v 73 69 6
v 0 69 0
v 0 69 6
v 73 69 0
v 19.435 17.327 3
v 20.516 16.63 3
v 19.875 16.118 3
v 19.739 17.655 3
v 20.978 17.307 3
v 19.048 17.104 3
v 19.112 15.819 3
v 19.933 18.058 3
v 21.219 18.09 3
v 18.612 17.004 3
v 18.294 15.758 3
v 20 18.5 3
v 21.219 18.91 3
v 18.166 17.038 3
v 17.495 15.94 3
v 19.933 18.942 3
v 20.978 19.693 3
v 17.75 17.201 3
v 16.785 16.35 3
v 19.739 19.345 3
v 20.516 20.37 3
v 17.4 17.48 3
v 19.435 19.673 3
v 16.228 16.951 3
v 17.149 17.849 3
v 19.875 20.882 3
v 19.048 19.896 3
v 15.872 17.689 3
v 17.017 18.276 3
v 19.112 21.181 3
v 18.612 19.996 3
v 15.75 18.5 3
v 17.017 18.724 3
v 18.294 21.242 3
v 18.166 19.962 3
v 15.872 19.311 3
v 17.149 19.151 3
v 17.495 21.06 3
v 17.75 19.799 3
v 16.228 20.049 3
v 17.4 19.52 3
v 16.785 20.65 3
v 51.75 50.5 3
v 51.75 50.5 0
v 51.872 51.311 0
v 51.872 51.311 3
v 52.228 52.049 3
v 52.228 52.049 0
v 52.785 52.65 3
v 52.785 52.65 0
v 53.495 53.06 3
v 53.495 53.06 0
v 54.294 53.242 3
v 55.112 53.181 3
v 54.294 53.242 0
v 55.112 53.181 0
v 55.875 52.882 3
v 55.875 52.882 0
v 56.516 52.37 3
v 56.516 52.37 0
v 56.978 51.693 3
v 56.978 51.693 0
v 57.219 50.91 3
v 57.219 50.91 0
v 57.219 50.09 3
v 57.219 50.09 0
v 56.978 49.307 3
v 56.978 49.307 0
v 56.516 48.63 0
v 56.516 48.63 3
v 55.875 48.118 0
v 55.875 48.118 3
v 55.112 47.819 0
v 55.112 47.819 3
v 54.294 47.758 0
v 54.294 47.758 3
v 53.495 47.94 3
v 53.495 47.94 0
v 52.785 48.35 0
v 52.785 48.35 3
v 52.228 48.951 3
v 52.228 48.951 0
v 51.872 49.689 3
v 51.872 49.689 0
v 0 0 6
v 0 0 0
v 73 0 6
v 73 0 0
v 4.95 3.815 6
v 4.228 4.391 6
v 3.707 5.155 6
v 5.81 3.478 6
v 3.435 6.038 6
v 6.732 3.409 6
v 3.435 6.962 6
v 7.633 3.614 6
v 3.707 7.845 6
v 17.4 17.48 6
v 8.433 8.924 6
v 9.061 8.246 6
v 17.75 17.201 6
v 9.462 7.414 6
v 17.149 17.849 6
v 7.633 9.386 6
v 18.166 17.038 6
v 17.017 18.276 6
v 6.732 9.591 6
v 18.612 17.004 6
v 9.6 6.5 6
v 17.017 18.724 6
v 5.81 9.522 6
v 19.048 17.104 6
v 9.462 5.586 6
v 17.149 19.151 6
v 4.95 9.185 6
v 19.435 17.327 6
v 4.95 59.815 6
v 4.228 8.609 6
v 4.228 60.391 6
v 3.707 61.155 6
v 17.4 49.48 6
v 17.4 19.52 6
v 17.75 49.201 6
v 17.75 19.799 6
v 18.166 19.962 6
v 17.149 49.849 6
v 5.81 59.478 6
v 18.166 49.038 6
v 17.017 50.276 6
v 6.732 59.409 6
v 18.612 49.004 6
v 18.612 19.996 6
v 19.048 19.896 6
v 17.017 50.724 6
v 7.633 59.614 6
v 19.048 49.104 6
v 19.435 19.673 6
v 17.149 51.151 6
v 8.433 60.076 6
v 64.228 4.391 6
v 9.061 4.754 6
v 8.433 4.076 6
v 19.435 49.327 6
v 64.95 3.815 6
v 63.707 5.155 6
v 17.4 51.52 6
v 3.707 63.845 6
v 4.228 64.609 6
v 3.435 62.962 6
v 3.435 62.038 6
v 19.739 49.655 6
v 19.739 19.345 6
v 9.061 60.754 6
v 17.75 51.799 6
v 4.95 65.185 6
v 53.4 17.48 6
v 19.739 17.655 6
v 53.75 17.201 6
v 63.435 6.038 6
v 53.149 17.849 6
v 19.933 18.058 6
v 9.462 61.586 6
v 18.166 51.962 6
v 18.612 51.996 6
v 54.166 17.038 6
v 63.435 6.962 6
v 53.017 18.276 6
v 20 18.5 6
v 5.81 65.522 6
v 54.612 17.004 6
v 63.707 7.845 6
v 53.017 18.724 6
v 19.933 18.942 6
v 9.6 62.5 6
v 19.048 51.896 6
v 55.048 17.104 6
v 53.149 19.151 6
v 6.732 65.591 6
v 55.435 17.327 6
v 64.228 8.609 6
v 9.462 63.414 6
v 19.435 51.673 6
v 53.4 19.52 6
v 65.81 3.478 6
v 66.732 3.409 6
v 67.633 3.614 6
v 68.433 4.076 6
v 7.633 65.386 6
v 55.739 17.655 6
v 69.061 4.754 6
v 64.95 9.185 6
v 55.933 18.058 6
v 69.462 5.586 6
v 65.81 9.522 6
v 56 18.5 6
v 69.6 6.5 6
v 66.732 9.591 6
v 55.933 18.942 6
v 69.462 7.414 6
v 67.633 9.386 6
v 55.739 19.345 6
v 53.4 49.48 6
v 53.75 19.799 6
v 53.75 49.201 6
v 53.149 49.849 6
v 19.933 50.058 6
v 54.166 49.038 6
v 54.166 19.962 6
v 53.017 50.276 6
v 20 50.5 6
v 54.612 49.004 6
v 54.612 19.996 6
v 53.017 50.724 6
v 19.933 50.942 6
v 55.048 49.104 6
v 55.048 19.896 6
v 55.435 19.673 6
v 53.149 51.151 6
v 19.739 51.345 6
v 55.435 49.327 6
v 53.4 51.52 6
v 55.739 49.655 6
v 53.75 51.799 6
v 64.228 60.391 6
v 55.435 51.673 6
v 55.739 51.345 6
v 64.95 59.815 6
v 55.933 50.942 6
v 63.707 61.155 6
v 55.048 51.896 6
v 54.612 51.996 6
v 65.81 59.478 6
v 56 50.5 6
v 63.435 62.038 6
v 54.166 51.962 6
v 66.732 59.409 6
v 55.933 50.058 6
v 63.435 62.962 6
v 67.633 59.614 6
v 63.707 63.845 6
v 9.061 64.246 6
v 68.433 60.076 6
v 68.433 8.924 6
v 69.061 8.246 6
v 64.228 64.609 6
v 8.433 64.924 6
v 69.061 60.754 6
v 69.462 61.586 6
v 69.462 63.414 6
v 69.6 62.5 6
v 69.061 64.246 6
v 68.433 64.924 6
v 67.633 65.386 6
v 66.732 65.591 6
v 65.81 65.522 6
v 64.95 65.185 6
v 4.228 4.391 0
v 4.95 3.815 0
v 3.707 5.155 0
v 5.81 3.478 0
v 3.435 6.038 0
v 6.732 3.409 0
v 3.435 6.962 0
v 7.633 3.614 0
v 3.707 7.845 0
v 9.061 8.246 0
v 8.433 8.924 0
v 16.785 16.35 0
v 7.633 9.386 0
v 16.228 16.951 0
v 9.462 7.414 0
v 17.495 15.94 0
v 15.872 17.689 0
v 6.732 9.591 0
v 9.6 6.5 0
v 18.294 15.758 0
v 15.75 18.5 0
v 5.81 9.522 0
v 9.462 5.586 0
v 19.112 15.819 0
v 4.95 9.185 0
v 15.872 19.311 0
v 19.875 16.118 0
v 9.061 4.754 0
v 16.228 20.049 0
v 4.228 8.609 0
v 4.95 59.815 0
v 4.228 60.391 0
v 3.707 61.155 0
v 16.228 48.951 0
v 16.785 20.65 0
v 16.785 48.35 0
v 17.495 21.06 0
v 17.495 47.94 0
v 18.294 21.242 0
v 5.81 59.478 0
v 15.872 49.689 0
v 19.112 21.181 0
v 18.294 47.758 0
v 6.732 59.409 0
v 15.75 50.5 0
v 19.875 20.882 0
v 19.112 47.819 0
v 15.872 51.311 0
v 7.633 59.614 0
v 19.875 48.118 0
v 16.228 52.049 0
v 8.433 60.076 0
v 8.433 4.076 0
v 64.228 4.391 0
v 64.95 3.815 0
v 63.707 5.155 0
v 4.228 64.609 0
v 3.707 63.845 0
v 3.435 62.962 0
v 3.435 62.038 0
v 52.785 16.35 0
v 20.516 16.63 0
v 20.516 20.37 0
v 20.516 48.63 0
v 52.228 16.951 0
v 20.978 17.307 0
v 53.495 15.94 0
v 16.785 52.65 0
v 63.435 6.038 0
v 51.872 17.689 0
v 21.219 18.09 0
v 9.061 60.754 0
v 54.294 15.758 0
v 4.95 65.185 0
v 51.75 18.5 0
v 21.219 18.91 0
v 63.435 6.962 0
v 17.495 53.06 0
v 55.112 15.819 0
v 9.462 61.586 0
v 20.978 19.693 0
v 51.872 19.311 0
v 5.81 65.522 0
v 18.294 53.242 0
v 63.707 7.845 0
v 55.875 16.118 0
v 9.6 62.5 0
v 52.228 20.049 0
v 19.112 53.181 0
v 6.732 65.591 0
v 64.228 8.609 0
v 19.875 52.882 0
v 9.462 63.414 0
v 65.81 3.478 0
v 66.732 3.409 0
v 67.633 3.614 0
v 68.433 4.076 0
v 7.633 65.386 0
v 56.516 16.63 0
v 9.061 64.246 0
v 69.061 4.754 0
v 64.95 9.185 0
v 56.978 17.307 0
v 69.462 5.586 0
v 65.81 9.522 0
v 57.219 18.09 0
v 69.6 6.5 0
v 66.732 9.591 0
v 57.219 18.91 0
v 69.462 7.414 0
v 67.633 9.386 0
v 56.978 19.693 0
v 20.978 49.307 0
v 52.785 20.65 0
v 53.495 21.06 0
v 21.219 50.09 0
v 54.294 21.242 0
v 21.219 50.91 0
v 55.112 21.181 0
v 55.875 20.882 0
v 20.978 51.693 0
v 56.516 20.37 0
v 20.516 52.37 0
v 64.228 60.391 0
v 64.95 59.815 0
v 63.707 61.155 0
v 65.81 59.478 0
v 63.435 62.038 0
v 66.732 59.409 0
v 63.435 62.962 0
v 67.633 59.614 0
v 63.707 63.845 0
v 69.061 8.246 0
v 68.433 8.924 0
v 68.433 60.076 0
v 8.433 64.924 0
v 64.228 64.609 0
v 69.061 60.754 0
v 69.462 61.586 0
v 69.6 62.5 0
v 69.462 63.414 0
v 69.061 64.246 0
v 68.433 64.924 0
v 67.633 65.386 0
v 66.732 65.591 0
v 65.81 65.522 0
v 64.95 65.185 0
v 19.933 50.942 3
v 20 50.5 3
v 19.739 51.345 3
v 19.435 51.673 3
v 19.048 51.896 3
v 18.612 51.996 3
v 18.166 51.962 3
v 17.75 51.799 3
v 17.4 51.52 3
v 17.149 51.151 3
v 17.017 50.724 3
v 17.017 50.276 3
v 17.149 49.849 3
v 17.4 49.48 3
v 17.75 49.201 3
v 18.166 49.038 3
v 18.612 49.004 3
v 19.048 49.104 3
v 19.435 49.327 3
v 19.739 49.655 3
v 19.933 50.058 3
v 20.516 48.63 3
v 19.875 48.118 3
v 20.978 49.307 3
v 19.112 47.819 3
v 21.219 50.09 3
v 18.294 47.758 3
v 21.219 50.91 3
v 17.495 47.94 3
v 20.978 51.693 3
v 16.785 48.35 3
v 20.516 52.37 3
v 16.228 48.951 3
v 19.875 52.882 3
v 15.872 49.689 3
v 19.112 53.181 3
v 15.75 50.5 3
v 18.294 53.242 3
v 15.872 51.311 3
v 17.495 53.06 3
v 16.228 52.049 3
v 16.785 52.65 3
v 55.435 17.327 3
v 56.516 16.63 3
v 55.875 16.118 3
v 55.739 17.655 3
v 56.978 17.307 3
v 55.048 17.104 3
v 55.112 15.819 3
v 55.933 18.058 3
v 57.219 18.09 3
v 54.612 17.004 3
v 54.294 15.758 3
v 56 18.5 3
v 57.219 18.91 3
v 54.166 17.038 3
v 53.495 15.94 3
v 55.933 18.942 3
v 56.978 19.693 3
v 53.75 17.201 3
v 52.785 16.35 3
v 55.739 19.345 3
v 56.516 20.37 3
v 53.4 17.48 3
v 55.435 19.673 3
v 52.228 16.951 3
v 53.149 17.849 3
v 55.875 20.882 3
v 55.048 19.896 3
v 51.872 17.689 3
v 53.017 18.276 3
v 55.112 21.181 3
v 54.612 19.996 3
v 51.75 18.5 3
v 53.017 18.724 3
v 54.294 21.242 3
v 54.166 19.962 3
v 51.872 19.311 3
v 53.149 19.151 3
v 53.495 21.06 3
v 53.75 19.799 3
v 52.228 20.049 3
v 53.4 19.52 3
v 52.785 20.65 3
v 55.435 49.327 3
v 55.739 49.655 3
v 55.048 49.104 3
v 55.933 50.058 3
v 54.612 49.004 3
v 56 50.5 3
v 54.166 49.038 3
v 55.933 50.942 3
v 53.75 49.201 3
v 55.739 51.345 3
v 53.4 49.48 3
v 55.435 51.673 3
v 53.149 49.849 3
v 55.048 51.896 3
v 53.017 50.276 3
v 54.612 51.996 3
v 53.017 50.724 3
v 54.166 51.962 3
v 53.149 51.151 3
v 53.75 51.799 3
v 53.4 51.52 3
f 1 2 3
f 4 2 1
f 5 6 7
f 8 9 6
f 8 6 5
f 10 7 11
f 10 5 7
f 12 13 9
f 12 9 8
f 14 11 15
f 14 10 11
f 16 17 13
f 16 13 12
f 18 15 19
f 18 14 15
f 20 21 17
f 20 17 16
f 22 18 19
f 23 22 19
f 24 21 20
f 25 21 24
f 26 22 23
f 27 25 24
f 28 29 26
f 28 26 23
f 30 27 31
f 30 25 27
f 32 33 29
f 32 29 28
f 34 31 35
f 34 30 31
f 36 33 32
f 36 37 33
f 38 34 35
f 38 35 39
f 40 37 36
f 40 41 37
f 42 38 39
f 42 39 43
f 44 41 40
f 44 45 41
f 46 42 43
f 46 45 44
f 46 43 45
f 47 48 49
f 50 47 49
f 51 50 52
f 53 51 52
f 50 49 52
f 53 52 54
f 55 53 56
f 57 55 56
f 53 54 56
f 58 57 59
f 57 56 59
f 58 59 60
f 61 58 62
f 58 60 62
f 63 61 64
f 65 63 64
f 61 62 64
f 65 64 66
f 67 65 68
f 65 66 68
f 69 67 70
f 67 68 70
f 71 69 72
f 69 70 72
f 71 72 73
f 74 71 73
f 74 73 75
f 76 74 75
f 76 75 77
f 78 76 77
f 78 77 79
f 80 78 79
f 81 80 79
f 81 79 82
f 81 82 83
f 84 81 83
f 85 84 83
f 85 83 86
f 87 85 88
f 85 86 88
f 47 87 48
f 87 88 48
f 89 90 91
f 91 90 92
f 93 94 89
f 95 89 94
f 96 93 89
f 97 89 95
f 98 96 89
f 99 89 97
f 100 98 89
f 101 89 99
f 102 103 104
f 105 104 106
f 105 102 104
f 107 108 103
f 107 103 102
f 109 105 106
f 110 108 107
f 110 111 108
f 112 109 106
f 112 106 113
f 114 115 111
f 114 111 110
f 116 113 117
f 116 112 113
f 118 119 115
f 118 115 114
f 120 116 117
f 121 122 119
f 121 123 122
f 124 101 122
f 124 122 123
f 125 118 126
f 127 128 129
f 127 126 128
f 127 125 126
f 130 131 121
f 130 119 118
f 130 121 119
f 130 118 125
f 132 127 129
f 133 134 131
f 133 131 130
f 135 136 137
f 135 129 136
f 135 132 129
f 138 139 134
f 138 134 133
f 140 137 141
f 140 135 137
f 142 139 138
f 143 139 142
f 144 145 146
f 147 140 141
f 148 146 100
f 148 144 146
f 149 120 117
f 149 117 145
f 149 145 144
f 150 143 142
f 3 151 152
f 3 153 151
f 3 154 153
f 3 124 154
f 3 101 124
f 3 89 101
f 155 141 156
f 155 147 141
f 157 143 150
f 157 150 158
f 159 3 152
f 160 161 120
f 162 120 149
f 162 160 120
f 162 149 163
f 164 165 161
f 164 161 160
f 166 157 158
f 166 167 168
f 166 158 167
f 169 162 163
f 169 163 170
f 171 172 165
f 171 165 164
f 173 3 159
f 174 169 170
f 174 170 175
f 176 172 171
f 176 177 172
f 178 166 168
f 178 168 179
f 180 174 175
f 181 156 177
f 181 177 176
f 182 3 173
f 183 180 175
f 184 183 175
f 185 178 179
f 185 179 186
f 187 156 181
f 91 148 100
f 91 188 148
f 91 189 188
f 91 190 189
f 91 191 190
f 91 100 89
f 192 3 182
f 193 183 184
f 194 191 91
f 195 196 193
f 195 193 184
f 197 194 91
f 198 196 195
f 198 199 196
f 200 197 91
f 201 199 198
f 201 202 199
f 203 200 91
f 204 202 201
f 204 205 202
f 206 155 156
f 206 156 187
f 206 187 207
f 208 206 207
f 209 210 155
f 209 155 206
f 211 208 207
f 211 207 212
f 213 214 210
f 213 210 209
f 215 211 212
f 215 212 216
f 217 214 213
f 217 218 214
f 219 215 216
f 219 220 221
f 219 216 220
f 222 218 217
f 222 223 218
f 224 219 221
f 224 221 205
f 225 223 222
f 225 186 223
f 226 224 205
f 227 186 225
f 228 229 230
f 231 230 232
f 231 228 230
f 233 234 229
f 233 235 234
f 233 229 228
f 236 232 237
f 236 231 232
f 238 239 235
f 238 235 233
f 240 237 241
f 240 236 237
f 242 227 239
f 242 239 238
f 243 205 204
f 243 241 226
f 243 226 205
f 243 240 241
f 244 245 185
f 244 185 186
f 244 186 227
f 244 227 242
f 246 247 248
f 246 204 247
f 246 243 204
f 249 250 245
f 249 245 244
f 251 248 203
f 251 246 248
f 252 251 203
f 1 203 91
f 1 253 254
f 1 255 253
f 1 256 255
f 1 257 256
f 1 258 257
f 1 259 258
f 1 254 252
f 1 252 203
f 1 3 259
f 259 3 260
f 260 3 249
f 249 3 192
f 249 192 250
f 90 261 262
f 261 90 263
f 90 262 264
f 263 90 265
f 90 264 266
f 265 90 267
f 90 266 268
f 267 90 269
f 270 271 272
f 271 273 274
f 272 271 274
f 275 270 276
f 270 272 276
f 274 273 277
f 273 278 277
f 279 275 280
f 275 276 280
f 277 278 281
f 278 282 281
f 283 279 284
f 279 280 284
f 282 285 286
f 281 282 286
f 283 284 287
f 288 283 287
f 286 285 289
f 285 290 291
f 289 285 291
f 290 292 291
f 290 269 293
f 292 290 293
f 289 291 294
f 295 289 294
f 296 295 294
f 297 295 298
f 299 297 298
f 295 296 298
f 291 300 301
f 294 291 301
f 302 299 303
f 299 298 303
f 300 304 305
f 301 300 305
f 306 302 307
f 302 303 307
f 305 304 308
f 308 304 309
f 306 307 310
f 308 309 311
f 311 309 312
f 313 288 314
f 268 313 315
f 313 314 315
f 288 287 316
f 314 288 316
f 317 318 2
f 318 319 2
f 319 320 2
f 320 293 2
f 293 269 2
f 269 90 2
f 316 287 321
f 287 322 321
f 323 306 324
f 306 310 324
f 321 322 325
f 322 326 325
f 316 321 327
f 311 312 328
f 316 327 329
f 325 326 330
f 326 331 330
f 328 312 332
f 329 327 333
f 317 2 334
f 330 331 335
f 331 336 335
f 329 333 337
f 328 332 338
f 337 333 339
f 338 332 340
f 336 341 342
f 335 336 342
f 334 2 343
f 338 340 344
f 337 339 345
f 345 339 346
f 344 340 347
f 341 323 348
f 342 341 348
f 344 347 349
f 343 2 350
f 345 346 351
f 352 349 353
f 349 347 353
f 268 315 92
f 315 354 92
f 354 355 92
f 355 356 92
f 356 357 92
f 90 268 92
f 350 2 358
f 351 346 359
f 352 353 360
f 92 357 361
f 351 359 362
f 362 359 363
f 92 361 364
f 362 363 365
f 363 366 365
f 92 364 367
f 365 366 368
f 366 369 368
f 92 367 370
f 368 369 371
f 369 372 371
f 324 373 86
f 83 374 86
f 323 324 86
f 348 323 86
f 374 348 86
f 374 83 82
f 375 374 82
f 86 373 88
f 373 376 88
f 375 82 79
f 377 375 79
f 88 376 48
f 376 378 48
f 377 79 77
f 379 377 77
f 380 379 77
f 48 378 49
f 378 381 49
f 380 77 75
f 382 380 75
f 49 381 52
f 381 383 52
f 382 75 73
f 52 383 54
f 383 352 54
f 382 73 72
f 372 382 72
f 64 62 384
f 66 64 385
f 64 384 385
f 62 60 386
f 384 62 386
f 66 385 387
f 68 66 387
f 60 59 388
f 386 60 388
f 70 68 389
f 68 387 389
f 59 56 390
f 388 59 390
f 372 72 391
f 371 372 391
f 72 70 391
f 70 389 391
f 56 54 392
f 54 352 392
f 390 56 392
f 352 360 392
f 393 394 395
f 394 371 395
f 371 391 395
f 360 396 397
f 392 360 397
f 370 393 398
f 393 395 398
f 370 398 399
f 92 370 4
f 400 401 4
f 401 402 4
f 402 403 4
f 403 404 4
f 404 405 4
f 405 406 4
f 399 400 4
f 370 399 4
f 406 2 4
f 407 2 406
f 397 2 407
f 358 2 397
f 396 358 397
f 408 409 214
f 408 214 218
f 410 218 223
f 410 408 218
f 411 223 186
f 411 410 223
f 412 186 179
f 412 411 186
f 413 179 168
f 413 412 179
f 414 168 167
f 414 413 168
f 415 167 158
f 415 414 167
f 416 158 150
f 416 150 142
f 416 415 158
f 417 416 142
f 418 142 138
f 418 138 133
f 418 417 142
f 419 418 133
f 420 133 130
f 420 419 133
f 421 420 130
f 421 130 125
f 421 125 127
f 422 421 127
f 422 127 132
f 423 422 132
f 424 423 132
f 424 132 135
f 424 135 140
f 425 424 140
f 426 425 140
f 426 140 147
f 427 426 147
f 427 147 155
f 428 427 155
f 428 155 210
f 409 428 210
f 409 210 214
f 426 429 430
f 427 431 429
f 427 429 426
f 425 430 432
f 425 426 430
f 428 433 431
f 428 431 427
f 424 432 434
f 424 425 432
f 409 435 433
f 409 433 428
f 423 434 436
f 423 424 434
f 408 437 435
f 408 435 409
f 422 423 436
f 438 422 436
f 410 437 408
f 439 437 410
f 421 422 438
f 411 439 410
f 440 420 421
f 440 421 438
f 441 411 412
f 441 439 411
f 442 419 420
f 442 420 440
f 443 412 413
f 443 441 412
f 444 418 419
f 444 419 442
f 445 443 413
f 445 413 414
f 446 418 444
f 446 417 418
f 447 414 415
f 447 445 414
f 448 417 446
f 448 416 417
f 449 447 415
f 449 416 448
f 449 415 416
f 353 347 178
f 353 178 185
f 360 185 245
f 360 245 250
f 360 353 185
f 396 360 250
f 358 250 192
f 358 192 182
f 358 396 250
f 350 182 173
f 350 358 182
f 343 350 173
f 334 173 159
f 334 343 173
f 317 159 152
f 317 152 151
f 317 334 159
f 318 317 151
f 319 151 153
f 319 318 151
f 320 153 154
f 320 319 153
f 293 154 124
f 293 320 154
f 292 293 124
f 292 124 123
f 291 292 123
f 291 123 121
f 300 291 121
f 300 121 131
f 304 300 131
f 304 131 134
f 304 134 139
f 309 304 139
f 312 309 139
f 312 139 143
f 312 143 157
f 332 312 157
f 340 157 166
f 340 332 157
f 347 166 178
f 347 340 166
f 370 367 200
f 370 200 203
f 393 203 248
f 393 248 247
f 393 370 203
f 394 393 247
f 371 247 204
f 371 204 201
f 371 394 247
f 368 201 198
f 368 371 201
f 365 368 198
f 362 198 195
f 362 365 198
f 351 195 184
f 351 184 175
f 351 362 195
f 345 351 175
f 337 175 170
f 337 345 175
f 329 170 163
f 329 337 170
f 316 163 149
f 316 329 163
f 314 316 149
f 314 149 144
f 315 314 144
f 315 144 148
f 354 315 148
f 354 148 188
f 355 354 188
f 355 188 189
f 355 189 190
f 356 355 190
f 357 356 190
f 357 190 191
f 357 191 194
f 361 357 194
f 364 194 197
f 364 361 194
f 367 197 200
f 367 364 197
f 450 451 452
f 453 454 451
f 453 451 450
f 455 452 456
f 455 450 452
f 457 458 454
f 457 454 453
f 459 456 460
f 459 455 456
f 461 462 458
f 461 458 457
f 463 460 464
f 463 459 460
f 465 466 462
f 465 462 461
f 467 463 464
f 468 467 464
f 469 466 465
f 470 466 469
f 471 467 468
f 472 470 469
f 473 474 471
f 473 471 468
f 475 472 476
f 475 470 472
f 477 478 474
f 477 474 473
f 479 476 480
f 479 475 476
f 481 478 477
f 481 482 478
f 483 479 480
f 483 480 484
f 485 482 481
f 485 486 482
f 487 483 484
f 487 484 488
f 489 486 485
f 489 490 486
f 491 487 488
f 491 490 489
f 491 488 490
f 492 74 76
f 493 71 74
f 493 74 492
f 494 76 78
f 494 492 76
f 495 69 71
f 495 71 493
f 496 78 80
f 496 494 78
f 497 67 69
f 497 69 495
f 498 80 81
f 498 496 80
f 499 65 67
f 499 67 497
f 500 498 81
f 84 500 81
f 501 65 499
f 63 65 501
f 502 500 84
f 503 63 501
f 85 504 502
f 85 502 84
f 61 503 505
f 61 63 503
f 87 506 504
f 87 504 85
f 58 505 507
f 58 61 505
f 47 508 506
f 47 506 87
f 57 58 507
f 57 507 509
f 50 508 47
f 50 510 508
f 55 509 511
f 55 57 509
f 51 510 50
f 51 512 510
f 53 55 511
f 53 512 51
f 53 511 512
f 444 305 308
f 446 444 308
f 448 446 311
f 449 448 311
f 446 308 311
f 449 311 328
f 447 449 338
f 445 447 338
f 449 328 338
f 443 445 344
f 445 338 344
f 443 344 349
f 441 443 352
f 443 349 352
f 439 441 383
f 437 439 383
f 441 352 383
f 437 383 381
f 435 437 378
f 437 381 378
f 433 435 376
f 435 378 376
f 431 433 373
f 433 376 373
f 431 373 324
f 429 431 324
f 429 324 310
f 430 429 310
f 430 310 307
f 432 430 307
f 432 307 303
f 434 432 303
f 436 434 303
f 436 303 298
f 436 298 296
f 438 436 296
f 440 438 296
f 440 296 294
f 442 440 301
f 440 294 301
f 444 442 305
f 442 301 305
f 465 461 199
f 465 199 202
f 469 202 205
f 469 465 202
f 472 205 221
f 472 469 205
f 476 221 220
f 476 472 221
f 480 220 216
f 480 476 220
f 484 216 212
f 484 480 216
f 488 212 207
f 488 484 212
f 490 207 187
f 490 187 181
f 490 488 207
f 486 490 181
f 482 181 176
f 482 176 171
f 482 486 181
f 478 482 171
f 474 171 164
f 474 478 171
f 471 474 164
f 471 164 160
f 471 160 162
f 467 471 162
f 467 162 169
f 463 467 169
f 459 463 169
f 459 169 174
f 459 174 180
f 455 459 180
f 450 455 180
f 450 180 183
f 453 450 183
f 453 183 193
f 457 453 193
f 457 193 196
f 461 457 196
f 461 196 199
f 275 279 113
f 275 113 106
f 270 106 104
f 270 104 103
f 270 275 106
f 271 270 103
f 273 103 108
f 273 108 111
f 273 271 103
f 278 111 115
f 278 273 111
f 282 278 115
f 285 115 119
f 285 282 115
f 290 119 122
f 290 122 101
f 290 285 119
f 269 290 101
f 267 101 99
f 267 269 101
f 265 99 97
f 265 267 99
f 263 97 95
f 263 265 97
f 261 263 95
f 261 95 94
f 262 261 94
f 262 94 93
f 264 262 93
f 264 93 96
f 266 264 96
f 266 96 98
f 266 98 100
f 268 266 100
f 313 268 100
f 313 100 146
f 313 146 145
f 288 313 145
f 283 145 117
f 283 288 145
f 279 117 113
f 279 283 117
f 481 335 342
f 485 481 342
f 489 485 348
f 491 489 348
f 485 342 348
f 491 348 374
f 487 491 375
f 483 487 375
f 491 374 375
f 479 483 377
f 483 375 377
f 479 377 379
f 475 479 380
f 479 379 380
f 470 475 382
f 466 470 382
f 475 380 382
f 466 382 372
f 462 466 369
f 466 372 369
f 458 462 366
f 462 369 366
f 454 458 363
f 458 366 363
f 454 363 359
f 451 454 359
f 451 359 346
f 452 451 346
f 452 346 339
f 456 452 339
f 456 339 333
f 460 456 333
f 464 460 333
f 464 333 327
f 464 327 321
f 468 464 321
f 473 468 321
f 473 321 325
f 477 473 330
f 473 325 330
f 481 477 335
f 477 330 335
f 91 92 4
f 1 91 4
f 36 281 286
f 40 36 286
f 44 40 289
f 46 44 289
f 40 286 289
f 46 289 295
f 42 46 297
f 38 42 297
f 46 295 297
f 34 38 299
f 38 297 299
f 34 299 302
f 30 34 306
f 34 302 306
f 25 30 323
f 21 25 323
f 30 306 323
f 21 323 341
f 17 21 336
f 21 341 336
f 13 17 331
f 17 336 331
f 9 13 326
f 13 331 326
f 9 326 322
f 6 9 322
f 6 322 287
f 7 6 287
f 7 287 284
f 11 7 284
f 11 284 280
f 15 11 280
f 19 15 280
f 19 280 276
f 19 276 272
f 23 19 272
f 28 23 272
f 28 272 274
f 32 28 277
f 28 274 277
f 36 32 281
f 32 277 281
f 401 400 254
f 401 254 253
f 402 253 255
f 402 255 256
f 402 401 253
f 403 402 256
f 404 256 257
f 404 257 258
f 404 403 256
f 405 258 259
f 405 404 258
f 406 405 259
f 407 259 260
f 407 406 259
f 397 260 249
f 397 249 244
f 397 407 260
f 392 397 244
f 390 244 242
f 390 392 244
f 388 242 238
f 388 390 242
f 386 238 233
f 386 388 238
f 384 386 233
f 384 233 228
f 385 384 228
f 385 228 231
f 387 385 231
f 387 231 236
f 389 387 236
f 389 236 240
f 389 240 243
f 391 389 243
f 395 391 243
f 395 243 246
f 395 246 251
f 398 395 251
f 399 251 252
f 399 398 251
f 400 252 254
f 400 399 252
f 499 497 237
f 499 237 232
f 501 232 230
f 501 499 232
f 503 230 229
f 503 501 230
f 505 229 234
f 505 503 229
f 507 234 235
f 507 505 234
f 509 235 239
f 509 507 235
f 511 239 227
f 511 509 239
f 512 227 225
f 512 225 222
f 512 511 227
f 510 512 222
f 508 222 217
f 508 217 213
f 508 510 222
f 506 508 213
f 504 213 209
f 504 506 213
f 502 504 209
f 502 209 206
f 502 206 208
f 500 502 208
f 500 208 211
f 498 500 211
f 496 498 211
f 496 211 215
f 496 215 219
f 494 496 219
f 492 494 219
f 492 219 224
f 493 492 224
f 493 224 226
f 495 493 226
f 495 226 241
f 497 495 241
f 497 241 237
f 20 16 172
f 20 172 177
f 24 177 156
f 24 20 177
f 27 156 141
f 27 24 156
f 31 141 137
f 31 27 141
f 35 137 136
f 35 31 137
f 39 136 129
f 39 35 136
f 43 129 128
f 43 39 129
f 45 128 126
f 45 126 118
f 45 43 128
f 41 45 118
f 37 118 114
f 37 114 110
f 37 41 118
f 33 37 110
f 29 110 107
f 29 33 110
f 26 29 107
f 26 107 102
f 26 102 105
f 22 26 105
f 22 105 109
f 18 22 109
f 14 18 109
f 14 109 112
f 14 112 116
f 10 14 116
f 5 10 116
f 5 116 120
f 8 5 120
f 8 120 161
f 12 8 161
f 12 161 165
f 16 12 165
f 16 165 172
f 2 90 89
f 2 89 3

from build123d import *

# Parameters (mm, degrees)
CROQUIS1_W              = 73
CROQUIS1_H              = 69
CROQUIS1_R              = 3.1
CROQUIS1_R_2            = 1.5
SALIENTE_EXTRUIR1_DEPTH = 6
CROQUIS2_R              = 2.75
CORTAR_EXTRUIR1_DEPTH   = 3


with BuildPart() as part:
    # Croquis1 → Saliente-Extruir1 (new body)
    with BuildSketch(Plane.XY):
        with Locations((36.5, 34.5)):
            Rectangle(CROQUIS1_W, CROQUIS1_H)
        with Locations((6.5, 6.5)):
            Circle(CROQUIS1_R, mode=Mode.SUBTRACT)
        with Locations((66.5, 6.5)):
            Circle(CROQUIS1_R, mode=Mode.SUBTRACT)
        with Locations((66.5, 62.5)):
            Circle(CROQUIS1_R, mode=Mode.SUBTRACT)
        with Locations((6.5, 62.5)):
            Circle(CROQUIS1_R, mode=Mode.SUBTRACT)
        with Locations((18.5, 50.5)):
            Circle(CROQUIS1_R_2, mode=Mode.SUBTRACT)
        with Locations((54.5, 50.5)):
            Circle(CROQUIS1_R_2, mode=Mode.SUBTRACT)
        with Locations((54.5, 18.5)):
            Circle(CROQUIS1_R_2, mode=Mode.SUBTRACT)
        with Locations((18.5, 18.5)):
            Circle(CROQUIS1_R_2, mode=Mode.SUBTRACT)
    extrude(amount=SALIENTE_EXTRUIR1_DEPTH)

    # Croquis2 → Cortar-Extruir1 (cut)
    with BuildSketch(Plane(origin=(0, 0, 0), x_dir=(-1, 0, 0), z_dir=(0, 0, -1))):
        with Locations((-54.5, 50.5)):
            Circle(CROQUIS2_R)
        with Locations((-18.5, 50.5)):
            Circle(CROQUIS2_R)
        with Locations((-18.5, 18.5)):
            Circle(CROQUIS2_R)
        with Locations((-54.5, 18.5)):
            Circle(CROQUIS2_R)
    extrude(amount=-CORTAR_EXTRUIR1_DEPTH, mode=Mode.SUBTRACT)


solid = part.part
